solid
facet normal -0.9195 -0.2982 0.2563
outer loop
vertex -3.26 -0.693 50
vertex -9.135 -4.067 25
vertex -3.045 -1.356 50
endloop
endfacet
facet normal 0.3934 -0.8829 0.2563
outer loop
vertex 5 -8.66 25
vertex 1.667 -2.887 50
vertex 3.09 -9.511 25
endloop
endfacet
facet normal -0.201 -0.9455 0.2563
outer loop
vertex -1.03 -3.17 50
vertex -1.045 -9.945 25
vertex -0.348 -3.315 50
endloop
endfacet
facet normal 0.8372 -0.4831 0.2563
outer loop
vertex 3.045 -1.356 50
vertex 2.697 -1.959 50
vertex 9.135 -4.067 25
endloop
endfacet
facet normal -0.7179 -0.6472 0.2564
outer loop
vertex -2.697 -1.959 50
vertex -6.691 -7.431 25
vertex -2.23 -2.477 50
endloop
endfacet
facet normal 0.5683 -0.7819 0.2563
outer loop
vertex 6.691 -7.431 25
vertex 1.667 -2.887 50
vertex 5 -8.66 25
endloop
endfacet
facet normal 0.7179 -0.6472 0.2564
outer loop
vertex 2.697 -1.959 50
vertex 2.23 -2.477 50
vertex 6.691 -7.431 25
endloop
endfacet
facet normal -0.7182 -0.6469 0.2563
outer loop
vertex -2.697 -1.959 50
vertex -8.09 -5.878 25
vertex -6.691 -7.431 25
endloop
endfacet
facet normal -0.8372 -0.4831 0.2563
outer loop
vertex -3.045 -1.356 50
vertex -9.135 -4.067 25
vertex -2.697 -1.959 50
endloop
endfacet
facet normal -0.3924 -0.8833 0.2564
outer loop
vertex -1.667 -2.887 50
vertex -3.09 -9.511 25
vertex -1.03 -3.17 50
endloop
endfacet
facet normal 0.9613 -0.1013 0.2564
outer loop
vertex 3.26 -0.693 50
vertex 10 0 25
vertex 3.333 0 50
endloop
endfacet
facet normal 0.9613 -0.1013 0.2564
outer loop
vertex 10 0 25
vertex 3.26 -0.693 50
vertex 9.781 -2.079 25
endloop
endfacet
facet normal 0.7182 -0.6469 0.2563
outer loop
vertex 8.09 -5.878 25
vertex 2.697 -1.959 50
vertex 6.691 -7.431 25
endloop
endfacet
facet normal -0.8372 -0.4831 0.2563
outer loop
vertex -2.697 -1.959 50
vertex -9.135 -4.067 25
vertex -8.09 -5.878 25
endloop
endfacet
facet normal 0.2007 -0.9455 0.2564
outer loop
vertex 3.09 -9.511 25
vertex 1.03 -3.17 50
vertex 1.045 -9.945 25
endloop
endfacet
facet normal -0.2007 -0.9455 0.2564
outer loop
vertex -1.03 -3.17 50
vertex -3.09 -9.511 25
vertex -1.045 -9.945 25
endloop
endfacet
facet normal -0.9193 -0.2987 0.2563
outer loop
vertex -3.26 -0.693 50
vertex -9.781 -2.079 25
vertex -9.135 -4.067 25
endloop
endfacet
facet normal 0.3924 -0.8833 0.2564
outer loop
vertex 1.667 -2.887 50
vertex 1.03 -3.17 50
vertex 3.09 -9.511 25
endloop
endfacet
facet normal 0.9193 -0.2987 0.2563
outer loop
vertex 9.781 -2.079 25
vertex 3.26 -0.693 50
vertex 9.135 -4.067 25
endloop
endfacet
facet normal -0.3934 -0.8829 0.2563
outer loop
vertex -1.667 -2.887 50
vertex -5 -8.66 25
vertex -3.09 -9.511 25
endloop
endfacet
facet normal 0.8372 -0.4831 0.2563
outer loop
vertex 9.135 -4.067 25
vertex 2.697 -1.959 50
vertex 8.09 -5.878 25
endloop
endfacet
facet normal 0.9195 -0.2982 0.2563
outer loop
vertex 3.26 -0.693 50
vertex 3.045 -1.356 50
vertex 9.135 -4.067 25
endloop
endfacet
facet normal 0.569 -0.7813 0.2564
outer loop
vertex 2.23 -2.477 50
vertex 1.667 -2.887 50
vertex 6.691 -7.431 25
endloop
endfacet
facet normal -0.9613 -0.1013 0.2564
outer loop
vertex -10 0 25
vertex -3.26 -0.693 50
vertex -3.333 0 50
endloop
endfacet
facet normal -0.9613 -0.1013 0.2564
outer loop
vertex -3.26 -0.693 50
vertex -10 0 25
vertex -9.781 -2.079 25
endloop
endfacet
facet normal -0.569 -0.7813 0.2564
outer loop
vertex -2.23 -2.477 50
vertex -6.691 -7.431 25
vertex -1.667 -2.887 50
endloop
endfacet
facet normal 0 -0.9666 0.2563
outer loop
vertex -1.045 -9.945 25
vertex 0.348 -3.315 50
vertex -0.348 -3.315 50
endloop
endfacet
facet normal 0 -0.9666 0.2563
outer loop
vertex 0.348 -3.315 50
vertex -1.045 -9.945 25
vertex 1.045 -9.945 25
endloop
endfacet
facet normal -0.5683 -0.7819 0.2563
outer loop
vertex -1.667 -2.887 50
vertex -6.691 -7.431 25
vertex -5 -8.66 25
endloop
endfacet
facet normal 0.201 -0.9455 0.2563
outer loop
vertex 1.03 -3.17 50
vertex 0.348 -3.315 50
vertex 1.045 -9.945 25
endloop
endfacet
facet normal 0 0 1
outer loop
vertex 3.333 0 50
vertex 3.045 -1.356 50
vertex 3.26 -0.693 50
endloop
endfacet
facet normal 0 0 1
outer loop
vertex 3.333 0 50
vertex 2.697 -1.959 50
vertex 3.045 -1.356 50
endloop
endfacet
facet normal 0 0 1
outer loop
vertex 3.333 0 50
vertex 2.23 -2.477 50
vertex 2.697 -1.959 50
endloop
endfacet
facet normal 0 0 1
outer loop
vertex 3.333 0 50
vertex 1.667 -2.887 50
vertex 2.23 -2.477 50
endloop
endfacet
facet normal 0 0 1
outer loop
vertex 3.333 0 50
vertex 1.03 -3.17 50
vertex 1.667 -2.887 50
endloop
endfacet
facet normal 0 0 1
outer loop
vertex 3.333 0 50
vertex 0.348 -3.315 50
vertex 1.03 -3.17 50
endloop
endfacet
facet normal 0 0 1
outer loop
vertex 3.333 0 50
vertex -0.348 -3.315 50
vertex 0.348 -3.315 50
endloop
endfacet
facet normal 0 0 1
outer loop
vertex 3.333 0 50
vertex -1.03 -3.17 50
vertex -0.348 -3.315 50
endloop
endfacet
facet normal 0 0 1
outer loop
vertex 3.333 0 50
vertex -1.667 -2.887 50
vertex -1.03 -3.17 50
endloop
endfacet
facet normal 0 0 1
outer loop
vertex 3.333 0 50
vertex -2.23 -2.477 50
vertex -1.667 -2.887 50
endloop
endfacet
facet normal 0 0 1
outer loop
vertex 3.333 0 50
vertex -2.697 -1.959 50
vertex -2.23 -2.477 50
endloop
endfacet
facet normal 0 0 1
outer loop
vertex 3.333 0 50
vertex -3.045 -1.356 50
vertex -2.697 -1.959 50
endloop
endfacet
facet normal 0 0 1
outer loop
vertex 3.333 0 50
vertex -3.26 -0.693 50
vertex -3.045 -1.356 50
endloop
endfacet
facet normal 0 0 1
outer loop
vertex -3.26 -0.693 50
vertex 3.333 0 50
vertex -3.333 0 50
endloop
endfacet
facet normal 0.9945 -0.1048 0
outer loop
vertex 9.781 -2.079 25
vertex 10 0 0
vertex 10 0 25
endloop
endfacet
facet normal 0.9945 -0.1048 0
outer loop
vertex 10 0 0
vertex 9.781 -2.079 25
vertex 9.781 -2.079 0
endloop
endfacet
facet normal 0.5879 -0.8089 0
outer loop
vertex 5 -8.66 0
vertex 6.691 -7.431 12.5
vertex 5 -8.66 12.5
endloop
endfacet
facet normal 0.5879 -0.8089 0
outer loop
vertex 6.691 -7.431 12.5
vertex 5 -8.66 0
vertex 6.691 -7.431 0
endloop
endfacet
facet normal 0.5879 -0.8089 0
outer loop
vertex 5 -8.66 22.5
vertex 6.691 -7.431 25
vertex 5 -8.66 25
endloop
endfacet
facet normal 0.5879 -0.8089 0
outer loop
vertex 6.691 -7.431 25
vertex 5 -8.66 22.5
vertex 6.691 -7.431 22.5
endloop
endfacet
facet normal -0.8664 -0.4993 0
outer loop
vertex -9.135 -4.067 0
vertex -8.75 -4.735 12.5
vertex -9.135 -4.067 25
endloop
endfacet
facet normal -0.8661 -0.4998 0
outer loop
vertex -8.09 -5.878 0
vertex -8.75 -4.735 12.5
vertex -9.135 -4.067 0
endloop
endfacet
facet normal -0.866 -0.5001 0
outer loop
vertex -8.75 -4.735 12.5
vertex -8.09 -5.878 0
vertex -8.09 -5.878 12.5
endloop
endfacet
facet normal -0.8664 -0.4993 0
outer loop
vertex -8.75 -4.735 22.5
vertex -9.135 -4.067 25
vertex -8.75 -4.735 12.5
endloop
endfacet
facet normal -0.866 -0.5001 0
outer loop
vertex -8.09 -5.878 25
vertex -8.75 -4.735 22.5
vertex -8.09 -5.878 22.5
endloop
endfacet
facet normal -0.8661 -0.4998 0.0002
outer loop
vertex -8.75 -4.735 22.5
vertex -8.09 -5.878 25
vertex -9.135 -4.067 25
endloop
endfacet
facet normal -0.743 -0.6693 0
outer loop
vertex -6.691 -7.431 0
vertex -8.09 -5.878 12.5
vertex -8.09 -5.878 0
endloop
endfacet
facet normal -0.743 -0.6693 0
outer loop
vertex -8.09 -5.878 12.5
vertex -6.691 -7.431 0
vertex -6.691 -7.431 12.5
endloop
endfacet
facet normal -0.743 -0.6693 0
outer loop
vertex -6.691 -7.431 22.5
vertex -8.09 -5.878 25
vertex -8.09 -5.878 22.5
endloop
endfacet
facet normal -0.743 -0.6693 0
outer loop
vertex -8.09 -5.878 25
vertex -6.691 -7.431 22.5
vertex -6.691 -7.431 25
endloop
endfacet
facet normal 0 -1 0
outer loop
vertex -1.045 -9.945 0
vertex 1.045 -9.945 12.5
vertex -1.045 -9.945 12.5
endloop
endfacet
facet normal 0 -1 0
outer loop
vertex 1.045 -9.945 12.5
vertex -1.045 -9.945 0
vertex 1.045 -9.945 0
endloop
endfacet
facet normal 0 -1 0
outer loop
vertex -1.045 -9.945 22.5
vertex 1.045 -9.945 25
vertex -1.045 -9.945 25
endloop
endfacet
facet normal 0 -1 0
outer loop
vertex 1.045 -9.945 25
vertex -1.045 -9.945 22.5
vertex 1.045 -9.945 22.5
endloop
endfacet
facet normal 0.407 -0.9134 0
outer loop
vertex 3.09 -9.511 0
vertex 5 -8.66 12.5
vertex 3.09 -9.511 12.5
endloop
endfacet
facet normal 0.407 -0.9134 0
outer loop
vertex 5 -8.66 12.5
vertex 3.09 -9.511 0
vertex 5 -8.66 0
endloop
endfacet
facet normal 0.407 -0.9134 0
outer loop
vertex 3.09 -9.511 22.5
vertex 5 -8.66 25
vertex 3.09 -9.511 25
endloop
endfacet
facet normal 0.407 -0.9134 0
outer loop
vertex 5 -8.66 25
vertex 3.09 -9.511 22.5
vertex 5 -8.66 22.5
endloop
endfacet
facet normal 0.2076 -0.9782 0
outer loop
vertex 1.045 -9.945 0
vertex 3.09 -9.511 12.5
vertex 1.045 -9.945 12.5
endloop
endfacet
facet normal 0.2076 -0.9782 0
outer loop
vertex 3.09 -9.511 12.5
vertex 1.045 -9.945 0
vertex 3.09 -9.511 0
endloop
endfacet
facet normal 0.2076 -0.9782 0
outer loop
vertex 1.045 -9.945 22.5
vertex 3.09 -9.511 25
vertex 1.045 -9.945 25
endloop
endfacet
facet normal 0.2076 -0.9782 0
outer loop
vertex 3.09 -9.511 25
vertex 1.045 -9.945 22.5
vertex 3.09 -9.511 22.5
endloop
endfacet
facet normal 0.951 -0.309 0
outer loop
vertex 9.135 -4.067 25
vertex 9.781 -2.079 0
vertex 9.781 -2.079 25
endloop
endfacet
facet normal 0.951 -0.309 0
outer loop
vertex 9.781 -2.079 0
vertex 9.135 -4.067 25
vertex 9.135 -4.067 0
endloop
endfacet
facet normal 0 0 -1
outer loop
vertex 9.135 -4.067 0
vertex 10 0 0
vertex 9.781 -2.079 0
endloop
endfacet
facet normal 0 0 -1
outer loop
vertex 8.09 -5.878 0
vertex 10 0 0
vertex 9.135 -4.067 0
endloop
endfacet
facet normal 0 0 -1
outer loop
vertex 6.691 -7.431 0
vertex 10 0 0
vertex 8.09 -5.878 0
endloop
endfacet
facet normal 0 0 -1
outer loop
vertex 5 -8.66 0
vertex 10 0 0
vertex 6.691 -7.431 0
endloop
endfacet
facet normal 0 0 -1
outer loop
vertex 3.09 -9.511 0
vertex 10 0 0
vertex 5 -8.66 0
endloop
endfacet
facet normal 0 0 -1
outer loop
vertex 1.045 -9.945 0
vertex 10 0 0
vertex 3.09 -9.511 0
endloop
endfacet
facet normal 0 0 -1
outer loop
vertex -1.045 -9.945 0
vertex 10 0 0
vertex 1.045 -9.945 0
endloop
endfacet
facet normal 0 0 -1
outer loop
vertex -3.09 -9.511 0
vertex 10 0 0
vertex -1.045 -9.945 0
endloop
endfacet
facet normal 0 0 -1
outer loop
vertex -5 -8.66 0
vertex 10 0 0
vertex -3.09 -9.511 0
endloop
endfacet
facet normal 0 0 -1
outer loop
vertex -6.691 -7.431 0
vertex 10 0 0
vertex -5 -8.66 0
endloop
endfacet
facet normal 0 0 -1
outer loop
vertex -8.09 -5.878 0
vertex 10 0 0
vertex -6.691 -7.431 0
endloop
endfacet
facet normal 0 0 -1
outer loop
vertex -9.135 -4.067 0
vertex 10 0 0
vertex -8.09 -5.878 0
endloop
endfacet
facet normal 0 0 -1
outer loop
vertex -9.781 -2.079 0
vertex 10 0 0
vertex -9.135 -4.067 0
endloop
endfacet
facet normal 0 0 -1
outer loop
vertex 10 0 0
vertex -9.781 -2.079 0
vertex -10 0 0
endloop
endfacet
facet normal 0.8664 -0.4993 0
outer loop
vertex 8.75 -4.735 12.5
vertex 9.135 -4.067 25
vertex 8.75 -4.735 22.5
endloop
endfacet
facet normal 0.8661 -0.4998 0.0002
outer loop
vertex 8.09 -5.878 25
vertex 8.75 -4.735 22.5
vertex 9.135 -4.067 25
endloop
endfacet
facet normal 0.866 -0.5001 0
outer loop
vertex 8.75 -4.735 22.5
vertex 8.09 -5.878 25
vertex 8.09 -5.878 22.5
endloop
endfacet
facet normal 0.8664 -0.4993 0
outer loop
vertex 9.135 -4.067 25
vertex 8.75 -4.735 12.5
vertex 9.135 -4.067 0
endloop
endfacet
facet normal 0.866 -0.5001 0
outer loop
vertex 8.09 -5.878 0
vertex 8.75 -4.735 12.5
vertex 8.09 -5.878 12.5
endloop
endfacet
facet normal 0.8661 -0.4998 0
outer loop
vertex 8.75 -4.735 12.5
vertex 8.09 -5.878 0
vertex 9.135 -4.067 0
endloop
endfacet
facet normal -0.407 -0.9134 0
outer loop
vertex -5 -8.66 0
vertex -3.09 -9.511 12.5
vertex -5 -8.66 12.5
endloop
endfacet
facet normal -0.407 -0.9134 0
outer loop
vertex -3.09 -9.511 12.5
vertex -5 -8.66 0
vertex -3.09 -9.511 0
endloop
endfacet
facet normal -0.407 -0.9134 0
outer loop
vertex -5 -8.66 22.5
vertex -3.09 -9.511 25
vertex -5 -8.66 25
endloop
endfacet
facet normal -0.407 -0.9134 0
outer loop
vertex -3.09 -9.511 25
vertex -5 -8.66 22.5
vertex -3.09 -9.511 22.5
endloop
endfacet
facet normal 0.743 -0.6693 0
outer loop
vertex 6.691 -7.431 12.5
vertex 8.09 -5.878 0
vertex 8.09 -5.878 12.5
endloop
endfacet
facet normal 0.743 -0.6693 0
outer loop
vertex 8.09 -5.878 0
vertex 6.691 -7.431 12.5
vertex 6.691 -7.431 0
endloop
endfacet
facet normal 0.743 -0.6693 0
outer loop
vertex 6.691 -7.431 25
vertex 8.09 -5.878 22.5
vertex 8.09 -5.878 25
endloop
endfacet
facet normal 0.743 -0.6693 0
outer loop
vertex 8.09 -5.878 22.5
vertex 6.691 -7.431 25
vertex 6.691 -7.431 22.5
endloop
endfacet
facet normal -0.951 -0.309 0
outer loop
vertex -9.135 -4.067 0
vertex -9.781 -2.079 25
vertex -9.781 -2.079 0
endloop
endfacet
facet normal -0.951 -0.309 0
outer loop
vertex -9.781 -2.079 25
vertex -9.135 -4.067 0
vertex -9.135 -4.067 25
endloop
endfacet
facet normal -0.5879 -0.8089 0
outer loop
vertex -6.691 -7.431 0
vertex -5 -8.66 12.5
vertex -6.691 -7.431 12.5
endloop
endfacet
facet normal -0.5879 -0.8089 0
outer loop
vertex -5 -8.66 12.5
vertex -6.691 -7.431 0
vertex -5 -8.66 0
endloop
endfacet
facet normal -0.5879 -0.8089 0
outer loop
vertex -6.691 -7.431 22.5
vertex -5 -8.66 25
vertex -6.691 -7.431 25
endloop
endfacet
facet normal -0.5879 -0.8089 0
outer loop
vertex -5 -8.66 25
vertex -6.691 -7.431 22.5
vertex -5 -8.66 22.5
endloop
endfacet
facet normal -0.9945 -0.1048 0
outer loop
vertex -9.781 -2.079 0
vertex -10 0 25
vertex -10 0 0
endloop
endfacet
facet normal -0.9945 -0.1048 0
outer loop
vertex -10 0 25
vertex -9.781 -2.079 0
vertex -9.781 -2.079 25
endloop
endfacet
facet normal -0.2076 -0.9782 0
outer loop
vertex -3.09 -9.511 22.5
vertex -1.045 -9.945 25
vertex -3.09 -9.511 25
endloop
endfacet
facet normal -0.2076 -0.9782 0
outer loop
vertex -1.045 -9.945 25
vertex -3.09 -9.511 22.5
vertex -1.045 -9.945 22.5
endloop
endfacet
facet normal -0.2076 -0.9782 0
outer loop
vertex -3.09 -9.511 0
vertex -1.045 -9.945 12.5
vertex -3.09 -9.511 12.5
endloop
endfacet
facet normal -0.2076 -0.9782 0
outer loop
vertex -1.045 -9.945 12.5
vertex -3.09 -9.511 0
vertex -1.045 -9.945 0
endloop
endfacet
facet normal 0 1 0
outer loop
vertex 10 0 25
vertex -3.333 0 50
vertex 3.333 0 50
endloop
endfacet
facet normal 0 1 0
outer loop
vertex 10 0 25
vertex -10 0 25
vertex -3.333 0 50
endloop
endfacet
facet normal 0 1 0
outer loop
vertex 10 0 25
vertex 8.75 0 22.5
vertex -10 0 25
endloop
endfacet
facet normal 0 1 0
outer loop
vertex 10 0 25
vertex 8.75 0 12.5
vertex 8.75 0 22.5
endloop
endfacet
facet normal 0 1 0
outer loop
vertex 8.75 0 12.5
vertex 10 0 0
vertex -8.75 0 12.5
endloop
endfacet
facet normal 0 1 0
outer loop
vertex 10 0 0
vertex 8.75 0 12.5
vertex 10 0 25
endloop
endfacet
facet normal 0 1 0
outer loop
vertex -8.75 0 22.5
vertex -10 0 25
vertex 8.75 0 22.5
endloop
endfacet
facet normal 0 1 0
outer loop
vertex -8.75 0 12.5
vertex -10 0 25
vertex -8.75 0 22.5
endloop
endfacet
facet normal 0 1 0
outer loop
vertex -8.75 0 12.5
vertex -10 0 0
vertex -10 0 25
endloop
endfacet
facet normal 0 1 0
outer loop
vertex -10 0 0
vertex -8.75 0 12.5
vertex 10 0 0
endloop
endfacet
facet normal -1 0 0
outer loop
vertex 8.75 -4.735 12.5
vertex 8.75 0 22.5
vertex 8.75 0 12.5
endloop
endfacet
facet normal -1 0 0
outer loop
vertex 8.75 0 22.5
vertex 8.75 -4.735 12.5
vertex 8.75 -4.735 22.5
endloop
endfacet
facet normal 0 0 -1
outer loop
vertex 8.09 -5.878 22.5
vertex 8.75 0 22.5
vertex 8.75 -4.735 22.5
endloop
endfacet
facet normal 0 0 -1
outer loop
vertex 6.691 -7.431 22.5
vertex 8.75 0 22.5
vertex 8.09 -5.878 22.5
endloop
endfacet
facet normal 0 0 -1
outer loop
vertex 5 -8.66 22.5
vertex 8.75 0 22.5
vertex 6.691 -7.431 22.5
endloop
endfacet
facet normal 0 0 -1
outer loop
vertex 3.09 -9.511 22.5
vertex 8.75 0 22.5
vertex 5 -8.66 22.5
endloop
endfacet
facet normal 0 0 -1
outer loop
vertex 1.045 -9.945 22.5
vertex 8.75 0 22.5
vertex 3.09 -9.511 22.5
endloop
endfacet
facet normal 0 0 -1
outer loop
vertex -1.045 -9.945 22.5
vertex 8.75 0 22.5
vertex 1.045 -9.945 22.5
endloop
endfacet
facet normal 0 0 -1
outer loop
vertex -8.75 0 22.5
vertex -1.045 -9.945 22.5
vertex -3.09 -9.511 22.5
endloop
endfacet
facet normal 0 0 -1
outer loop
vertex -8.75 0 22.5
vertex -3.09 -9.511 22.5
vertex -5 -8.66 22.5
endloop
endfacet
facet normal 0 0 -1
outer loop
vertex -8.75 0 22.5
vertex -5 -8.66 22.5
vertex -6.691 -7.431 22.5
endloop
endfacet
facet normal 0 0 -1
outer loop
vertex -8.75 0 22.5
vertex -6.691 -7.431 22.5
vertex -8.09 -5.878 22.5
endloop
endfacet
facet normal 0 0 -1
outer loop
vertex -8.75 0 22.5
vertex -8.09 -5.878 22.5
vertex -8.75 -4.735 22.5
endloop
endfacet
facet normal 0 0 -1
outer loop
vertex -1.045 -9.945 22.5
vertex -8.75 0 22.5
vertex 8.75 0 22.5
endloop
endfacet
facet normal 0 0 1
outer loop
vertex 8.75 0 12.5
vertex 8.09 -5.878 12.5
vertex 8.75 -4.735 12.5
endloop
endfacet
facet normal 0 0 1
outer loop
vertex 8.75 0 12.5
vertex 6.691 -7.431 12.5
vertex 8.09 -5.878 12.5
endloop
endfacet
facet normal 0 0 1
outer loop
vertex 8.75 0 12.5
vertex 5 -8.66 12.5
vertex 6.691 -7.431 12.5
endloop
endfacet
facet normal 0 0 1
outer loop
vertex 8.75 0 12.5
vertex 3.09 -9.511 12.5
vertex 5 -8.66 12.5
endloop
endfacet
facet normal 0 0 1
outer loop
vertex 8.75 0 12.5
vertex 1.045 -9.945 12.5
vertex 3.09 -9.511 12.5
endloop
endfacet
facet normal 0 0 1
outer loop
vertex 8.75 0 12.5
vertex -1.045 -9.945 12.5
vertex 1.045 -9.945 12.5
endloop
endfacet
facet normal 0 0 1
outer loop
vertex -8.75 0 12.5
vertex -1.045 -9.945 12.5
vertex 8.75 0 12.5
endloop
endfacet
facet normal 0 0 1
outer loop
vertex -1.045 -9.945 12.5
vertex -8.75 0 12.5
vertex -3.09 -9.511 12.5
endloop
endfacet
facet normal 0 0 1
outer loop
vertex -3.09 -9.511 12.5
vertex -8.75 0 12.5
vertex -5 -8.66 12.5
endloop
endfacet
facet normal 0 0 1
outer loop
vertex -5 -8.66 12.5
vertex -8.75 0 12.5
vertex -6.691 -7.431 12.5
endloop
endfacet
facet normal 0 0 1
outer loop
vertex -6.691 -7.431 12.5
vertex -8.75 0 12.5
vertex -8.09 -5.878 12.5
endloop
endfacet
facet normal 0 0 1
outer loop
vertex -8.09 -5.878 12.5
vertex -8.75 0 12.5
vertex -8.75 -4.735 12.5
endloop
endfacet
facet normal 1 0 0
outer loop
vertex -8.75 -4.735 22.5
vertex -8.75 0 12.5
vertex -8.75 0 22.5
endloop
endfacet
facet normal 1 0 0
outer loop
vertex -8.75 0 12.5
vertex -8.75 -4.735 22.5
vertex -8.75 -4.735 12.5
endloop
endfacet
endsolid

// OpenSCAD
basic_opener("edan");


module basic_opener(letter, size=50) {
    coin_radius = 9;
    coin_height = 2;
    bottle_body_height = size/2;
    bottle_body_radius = size/5;
    bottle_neck_height = size/2;
    bottle_neck_radius = size/15;
    padding = 2.5;
        
    difference() {
        group(){
        translate([0,0,bottle_body_height]) cylinder(h=bottle_neck_height, r1=bottle_body_radius, r2=bottle_neck_radius); // bottle neck
        translate([0,0,0]) cylinder(h=bottle_body_height, r=bottle_body_radius); // bottle body
        }
        translate([-bottle_body_radius,0,-padding/2]) cube([bottle_body_radius*2,bottle_body_radius*2,bottle_body_height+bottle_neck_height+padding]); // frame 
        translate([-bottle_body_radius+padding/2,-bottle_body_radius,bottle_body_height/2]) cube([2*bottle_body_radius-padding,2*bottle_body_radius-padding,10]);
        
    }
}
